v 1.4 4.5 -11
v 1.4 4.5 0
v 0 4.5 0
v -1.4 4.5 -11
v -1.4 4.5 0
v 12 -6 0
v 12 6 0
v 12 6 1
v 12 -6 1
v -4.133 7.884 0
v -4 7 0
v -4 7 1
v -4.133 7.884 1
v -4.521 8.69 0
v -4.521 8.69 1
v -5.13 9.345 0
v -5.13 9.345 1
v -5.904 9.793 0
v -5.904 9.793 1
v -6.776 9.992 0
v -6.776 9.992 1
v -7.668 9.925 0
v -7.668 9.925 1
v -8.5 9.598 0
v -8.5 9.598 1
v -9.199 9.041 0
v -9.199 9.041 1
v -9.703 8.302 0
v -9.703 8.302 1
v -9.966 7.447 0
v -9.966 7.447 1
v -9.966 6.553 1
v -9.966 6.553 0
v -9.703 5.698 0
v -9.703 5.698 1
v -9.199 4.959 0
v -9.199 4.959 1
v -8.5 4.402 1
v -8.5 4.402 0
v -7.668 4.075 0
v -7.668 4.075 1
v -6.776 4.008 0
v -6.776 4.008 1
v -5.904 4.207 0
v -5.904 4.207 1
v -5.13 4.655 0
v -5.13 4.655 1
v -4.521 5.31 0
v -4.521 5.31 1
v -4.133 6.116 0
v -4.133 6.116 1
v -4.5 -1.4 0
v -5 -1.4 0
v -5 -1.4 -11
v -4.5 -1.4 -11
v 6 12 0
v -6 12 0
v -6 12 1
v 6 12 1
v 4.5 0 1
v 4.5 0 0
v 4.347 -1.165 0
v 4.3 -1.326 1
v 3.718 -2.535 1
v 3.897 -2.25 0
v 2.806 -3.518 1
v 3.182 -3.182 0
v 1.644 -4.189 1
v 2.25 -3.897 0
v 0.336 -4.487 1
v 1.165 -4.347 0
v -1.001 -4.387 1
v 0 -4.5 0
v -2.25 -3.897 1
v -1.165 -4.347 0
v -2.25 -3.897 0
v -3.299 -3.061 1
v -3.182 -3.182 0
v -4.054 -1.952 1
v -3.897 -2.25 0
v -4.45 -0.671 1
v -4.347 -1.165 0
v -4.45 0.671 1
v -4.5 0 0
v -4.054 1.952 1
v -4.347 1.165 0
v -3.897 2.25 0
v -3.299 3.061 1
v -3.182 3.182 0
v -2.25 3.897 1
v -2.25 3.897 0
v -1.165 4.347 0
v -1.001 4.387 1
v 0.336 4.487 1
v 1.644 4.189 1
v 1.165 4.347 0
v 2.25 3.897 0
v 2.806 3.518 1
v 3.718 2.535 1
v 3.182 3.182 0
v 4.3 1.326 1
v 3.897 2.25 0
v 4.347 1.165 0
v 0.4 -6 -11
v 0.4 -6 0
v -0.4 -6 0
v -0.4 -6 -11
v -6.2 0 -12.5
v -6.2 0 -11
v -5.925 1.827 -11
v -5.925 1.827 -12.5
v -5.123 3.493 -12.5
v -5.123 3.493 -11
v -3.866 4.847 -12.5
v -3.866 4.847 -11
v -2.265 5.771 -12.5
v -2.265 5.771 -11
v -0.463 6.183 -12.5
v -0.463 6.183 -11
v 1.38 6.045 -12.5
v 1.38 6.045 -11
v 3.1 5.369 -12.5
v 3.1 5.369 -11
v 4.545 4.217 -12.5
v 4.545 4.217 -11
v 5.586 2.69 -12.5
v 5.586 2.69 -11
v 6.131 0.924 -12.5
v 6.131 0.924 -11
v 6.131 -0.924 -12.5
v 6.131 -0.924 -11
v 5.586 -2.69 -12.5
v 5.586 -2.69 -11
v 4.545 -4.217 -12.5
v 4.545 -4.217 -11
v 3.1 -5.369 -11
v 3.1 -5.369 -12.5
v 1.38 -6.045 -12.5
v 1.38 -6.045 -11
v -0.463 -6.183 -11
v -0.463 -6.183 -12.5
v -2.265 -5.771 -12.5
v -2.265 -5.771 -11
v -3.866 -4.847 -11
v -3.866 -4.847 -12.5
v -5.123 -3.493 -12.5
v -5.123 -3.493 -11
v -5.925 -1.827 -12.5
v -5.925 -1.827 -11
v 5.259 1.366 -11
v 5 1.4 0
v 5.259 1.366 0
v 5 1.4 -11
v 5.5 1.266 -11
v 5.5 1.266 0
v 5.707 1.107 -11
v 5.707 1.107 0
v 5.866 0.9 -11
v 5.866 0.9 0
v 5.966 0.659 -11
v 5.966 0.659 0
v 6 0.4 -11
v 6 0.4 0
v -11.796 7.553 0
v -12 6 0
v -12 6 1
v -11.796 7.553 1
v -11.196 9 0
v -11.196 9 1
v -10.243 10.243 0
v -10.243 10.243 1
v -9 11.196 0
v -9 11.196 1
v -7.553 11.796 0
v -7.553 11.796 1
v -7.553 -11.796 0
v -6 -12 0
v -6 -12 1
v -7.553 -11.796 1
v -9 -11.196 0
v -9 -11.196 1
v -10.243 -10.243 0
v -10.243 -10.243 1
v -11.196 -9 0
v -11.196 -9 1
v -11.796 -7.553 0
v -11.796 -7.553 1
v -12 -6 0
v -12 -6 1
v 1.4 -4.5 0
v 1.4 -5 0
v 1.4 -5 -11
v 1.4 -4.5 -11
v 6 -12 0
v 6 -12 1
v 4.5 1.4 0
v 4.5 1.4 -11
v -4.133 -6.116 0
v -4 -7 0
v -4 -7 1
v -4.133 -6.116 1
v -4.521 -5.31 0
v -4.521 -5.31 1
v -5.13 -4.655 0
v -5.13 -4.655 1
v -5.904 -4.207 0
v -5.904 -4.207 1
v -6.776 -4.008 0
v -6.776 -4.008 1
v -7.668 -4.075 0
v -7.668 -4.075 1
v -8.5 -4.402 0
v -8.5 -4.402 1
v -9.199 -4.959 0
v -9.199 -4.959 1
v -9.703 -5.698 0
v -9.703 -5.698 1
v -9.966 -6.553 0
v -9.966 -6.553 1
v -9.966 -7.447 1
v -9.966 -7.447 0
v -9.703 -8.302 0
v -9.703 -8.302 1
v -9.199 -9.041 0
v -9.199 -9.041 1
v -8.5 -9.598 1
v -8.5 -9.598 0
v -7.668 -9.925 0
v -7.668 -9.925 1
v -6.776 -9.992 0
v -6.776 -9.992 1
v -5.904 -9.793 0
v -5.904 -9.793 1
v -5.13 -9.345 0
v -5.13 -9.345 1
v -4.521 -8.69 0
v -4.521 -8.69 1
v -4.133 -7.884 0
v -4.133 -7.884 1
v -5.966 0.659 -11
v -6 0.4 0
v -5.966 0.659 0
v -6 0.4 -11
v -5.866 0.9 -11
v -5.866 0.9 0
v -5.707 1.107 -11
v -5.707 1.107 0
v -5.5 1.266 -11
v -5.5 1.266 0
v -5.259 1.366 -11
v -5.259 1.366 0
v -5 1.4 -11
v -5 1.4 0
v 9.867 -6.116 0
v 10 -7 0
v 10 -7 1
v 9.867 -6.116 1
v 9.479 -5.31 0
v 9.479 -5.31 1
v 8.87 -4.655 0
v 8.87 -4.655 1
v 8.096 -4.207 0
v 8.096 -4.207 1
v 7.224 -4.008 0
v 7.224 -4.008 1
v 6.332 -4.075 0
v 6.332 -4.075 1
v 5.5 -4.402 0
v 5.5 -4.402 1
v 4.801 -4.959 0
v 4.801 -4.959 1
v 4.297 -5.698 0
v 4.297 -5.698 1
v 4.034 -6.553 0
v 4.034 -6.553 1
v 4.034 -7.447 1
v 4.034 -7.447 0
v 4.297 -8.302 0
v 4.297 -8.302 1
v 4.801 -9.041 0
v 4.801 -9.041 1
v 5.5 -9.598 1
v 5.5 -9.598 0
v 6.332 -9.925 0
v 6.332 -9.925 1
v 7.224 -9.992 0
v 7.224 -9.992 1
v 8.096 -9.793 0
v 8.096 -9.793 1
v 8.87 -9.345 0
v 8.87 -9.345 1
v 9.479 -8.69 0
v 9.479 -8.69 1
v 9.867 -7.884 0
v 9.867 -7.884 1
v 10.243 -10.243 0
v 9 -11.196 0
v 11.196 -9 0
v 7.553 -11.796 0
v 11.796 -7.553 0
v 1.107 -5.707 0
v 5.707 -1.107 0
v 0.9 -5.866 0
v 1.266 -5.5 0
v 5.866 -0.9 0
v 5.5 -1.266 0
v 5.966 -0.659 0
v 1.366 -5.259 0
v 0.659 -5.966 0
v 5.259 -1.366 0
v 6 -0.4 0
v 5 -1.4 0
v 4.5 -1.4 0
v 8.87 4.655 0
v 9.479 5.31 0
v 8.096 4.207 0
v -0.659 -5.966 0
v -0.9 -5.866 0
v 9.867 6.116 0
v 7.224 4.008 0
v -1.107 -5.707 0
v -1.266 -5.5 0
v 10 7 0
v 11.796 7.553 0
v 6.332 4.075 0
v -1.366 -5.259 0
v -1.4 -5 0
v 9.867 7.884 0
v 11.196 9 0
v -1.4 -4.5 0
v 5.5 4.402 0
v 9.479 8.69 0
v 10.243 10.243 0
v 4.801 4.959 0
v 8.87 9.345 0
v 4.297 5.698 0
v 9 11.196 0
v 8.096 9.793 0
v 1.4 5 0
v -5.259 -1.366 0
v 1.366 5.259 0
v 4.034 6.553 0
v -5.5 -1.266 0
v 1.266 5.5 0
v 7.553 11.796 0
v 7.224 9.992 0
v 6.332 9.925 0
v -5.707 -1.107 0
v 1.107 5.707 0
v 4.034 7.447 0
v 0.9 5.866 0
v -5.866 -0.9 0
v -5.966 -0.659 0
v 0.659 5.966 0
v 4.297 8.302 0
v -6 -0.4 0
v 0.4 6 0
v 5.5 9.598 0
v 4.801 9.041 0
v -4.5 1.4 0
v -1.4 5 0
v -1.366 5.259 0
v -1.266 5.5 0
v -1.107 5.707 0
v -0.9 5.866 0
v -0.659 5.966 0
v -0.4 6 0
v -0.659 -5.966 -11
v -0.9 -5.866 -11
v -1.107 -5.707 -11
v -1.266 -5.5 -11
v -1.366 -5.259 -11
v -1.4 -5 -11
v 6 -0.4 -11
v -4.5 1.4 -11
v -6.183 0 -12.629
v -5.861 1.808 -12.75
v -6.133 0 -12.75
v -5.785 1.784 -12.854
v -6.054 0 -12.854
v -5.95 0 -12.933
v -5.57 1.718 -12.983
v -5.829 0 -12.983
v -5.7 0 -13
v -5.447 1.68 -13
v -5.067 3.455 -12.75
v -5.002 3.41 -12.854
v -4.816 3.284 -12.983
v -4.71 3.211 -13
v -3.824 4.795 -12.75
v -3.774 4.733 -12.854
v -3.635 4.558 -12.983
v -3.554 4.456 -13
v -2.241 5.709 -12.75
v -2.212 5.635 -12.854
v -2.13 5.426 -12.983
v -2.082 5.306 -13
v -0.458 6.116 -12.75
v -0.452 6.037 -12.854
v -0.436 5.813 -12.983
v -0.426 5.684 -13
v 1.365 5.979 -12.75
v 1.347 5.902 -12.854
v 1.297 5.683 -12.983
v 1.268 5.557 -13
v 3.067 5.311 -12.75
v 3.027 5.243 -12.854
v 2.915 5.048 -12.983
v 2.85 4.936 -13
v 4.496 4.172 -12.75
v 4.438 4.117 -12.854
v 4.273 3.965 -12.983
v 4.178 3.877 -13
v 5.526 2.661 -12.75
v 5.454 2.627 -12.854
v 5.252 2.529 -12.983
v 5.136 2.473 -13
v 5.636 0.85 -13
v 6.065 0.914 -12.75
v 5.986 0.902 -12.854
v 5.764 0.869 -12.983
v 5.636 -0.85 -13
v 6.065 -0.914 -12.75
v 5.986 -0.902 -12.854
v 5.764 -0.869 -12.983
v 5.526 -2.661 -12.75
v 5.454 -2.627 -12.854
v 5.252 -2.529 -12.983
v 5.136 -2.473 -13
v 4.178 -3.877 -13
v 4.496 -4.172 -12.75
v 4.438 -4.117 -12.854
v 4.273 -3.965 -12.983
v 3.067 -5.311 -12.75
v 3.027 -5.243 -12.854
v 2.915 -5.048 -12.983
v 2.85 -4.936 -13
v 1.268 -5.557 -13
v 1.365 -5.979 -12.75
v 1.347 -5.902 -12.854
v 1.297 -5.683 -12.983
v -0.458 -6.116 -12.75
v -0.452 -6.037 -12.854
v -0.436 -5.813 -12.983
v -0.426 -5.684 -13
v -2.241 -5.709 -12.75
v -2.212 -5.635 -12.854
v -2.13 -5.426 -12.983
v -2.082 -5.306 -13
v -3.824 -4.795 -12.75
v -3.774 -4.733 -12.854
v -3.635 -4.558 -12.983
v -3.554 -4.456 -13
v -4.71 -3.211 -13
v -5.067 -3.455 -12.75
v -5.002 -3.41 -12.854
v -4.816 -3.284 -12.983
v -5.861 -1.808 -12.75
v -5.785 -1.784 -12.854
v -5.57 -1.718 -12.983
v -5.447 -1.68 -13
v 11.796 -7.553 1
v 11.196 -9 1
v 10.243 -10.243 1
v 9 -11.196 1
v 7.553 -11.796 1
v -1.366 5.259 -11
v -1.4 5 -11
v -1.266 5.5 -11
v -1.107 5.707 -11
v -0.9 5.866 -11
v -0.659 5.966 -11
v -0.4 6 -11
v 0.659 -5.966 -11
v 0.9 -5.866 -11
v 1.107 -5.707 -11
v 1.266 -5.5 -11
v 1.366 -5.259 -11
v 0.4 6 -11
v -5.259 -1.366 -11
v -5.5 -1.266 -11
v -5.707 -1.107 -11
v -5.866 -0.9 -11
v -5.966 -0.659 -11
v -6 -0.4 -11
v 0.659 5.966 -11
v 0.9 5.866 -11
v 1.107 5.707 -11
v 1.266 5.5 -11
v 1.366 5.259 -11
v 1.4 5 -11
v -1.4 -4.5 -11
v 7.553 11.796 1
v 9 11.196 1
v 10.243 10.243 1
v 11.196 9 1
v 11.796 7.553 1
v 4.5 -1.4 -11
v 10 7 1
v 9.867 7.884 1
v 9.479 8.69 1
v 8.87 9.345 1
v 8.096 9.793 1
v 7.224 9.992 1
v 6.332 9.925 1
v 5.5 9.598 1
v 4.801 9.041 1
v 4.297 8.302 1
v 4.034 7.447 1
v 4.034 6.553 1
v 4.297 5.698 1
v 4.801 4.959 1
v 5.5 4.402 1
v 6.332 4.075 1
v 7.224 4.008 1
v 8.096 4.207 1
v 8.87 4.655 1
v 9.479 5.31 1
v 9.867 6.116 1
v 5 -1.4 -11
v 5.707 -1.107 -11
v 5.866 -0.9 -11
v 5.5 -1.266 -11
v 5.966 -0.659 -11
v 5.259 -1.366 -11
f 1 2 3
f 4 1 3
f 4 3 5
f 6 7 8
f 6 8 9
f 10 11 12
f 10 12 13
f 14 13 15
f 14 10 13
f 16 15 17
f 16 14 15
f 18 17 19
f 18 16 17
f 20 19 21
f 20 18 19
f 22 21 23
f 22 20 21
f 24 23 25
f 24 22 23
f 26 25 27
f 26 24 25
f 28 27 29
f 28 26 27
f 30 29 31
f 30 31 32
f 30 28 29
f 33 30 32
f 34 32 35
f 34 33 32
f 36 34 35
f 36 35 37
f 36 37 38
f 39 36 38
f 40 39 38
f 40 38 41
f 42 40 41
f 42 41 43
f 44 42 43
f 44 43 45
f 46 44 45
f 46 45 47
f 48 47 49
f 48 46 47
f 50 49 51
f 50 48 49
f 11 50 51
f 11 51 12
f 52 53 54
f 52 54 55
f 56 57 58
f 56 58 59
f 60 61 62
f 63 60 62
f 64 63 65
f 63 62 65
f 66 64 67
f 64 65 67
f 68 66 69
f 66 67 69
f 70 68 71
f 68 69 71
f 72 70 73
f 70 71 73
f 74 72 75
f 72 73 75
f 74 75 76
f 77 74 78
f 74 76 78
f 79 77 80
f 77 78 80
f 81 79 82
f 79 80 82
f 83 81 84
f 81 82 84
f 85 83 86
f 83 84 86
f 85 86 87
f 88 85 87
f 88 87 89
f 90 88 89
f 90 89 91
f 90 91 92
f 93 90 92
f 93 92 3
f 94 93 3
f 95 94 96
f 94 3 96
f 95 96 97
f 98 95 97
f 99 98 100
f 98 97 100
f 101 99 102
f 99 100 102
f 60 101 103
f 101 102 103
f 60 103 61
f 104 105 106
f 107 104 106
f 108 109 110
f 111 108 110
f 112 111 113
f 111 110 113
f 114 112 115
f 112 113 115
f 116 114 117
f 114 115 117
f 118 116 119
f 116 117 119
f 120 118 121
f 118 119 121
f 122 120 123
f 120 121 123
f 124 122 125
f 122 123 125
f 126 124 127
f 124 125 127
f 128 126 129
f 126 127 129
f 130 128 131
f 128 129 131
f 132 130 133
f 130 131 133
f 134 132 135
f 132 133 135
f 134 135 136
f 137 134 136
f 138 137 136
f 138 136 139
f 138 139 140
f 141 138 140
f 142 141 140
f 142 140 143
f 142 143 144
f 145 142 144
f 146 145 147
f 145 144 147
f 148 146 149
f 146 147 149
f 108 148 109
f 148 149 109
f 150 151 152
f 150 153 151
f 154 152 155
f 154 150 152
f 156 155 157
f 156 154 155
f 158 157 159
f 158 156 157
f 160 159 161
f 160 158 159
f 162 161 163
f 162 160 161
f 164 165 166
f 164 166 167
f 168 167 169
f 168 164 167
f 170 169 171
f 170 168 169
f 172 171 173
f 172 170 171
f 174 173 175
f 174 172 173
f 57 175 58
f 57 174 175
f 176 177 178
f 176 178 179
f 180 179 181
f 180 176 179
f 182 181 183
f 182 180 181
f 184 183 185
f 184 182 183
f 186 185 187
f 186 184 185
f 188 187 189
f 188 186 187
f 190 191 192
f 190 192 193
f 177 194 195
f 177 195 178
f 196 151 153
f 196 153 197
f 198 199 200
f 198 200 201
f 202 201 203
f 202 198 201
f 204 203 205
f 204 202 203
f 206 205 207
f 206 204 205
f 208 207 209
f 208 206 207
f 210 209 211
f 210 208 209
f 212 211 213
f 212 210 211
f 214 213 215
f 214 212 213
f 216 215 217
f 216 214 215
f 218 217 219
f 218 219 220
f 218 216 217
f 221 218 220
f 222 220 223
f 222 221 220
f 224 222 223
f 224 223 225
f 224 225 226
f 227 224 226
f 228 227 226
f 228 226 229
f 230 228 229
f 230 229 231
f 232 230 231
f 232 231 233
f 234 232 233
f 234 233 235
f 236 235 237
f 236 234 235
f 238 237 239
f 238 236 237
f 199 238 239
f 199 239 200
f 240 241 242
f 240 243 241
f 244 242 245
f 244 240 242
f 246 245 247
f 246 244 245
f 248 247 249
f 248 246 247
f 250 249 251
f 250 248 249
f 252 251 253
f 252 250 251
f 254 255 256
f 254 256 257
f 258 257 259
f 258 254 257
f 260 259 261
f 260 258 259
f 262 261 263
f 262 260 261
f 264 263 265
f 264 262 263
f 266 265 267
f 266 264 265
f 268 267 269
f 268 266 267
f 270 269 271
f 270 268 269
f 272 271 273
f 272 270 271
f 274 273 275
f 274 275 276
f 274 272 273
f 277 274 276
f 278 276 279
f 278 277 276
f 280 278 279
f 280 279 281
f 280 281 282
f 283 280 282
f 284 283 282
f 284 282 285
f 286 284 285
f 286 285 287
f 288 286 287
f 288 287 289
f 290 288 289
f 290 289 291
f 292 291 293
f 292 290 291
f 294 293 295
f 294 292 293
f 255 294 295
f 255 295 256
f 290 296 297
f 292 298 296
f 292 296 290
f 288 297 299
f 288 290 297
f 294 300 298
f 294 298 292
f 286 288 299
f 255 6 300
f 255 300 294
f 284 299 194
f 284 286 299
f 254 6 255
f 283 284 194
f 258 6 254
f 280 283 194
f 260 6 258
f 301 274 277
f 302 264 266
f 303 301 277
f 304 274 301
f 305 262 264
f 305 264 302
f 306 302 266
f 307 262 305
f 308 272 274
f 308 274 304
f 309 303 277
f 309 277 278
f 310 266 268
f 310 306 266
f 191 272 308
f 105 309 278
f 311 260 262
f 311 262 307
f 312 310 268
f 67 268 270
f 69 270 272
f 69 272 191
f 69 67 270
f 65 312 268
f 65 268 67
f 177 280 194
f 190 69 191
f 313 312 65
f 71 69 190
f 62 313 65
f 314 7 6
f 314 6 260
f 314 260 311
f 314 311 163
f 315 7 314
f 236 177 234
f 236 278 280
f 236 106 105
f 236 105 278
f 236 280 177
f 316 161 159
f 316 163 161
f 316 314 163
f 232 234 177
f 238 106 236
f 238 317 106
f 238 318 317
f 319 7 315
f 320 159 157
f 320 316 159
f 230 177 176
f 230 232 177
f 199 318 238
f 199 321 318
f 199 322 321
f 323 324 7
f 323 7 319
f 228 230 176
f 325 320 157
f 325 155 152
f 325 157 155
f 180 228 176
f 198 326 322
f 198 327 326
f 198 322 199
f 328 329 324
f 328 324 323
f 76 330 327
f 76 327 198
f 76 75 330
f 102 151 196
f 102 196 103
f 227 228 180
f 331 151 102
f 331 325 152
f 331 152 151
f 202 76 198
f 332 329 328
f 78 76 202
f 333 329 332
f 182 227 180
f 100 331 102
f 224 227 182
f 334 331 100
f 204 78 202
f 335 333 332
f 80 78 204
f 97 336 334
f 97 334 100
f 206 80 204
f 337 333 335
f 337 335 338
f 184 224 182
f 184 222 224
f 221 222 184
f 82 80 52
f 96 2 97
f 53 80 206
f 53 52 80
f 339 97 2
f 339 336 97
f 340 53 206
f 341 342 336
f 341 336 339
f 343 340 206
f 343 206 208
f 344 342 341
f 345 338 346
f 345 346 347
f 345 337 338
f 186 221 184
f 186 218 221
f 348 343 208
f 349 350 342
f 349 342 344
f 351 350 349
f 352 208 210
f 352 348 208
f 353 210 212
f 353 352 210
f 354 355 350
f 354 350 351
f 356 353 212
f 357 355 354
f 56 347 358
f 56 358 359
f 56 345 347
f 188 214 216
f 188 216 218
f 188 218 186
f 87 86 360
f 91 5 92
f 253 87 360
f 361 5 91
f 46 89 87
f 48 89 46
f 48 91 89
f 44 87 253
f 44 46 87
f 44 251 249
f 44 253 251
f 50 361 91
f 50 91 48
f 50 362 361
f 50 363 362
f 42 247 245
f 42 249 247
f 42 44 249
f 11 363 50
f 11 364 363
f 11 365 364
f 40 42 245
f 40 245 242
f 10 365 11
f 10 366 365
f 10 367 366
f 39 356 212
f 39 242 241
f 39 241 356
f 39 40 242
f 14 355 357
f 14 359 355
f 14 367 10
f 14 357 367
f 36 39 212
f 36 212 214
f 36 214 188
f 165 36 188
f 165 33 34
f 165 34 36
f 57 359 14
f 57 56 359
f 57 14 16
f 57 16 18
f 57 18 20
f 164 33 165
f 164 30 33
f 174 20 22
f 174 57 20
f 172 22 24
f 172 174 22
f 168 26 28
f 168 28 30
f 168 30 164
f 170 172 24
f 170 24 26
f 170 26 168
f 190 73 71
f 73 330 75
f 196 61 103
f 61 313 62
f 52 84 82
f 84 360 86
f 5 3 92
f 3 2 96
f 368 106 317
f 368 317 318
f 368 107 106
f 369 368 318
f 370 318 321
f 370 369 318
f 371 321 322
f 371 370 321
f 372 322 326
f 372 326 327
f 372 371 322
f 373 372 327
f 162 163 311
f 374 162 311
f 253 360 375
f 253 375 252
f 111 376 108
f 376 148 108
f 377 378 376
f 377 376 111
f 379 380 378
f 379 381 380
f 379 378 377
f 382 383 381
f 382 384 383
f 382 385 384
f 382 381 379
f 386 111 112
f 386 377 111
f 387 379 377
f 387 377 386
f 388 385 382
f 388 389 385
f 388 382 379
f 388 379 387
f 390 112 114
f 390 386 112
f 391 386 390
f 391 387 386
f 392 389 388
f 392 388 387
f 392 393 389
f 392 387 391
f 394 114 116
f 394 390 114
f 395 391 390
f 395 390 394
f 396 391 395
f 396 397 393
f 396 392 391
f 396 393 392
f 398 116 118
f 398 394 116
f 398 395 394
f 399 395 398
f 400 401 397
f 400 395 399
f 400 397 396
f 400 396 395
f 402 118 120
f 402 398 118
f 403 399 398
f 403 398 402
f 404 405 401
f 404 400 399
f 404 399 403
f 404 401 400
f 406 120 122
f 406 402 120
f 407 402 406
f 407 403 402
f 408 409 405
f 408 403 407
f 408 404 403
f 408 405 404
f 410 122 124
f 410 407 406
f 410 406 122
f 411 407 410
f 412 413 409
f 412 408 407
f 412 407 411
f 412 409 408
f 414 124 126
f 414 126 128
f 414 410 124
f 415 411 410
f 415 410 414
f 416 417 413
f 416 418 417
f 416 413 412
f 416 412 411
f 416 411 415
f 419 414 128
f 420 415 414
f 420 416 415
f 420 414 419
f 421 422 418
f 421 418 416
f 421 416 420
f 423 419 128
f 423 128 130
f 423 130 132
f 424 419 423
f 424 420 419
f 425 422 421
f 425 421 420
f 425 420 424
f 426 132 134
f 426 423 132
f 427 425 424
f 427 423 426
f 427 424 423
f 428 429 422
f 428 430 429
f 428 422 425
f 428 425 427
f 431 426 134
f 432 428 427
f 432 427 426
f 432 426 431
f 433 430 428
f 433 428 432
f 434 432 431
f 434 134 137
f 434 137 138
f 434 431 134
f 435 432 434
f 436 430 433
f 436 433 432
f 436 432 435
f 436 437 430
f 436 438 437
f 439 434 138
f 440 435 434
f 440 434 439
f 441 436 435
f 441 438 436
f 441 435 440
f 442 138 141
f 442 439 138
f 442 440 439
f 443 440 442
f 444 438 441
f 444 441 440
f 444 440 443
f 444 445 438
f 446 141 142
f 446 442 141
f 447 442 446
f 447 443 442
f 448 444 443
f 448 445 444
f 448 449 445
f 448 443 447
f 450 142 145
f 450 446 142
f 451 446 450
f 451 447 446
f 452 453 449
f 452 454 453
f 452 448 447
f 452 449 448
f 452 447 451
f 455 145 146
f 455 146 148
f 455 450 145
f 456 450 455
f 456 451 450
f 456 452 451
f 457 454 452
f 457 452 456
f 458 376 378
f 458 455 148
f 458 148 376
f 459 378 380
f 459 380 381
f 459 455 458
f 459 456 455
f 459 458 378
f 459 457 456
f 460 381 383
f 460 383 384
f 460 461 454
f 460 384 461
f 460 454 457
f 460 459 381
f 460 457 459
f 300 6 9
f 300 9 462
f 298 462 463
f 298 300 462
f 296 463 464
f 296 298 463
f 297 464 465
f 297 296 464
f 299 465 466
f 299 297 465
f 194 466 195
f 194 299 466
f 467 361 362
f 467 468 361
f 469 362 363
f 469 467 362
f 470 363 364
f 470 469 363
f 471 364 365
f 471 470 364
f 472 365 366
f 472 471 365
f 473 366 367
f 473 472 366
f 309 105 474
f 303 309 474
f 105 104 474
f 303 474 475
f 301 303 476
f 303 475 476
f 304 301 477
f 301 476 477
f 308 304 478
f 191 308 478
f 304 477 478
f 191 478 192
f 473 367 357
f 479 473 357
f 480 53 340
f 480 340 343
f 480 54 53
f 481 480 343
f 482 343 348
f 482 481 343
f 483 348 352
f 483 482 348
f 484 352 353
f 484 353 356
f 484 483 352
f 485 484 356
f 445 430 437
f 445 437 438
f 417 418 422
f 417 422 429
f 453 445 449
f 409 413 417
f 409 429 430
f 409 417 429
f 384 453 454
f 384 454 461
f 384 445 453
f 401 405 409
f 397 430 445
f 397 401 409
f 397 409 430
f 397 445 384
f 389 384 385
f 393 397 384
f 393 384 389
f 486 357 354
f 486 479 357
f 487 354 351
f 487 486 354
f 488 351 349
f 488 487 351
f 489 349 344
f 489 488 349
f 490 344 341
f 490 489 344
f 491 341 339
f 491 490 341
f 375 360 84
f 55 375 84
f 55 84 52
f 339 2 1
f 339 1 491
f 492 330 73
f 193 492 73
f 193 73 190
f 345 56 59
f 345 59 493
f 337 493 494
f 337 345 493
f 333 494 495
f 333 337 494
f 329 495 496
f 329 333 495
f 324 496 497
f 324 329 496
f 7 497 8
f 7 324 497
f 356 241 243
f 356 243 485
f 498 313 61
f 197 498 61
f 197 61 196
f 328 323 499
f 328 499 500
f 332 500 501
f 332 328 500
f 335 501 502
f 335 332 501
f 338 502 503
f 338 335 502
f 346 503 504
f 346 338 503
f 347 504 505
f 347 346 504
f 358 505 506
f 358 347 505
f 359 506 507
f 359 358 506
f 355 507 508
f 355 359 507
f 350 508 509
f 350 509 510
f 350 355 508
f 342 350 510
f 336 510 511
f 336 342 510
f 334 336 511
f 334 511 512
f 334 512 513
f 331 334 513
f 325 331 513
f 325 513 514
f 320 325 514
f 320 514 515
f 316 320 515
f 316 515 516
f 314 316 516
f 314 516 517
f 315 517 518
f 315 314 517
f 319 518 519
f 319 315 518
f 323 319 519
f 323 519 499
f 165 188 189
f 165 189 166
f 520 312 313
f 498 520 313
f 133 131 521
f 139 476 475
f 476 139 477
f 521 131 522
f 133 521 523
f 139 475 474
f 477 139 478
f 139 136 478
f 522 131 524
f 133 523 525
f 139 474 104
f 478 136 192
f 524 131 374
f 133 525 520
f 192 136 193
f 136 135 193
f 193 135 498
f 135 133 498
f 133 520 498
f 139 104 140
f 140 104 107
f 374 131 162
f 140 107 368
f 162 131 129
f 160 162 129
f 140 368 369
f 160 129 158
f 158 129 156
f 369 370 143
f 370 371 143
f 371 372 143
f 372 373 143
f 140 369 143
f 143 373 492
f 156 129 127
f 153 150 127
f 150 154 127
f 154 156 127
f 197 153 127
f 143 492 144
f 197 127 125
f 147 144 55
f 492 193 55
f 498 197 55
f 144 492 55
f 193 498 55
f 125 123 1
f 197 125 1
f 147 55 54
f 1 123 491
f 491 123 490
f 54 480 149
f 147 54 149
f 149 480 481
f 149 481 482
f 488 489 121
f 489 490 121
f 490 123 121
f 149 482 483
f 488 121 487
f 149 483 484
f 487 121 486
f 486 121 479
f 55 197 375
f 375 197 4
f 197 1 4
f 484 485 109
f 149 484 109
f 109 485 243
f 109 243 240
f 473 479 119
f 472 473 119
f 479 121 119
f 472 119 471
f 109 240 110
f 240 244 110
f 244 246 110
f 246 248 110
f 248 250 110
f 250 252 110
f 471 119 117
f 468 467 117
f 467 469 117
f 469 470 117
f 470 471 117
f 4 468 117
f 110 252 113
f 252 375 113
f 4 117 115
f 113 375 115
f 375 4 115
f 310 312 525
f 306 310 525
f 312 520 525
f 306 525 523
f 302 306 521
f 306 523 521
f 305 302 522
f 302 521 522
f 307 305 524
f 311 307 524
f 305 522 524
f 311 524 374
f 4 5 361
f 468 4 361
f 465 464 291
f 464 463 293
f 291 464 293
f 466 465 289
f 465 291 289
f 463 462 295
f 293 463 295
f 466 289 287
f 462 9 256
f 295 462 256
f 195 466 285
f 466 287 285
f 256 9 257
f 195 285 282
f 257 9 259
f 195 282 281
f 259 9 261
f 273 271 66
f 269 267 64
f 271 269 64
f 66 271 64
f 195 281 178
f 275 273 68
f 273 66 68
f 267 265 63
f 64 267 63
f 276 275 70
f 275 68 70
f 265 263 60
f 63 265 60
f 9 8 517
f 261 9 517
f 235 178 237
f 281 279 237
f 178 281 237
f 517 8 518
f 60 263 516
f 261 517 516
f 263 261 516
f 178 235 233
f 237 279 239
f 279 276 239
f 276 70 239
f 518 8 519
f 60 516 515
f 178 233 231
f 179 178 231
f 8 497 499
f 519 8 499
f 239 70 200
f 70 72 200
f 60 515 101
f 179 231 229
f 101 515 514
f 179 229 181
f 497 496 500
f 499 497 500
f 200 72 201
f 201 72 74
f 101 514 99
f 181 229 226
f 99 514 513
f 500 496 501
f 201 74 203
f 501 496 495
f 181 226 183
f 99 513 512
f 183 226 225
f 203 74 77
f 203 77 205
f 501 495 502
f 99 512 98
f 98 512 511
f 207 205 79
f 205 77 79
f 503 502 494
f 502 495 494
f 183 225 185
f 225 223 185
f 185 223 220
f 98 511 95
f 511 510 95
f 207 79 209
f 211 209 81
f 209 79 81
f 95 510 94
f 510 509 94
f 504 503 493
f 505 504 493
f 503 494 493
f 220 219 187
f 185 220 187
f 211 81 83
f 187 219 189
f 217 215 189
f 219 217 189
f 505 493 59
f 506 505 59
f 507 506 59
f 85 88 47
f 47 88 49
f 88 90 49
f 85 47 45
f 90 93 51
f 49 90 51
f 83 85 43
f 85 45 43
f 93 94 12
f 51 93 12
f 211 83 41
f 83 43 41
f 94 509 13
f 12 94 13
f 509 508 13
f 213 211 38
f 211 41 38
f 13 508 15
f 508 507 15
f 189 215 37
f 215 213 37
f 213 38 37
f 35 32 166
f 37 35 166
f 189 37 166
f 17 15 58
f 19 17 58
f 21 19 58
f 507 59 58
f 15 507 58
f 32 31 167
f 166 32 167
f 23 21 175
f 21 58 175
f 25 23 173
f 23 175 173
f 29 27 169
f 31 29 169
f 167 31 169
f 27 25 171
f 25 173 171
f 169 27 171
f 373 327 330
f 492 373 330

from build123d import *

# Parameters (mm, degrees)
SKETCH2_R           = 3
BOSS_EXTRUDE2_DEPTH = 1
SKETCH6_W           = 2.8
SKETCH6_H           = 1.5
SKETCH6_W_2         = 1.5
SKETCH6_H_2         = 2.8
BOSS_EXTRUDE5_DEPTH = 11
FILLET4_R           = 1
SKETCH8_R           = 4.5
CUT_EXTRUDE1_DEPTH  = 20
SKETCH9_R           = 6.2
BOSS_EXTRUDE6_DEPTH = 2
FILLET5_R           = 0.5


with BuildPart() as part:
    # Sketch2 → Boss-Extrude2 (new body)
    with BuildSketch(Plane.XY):
        with BuildLine():
            Line((12, -6), (12, 0))
            Line((12, 0), (12, 6))
            ThreePointArc((12, 6), (10.242640687, 10.242640687), (6, 12))
            Line((6, 12), (0, 12))
            Line((0, 12), (-6, 12))
            ThreePointArc((-6, 12), (-10.242640687, 10.242640687), (-12, 6))
            Line((-12, 6), (-12, 0))
            Line((-12, 0), (-12, -6))
            ThreePointArc((-12, -6), (-10.242640687, -10.242640687), (-6, -12))
            Line((-6, -12), (0, -12))
            Line((0, -12), (6, -12))
            ThreePointArc((6, -12), (10.242640687, -10.242640687), (12, -6))
        make_face()
        with Locations((-7, -7)):
            Circle(SKETCH2_R, mode=Mode.SUBTRACT)
        with Locations((7, -7)):
            Circle(SKETCH2_R, mode=Mode.SUBTRACT)
        with Locations((-7, 7)):
            Circle(SKETCH2_R, mode=Mode.SUBTRACT)
        Circle(SKETCH2_R, mode=Mode.SUBTRACT)
        with Locations((7, 7)):
            Circle(SKETCH2_R, mode=Mode.SUBTRACT)
    extrude(amount=BOSS_EXTRUDE2_DEPTH)

    # Sketch6 → Boss-Extrude5 (add)
    with BuildSketch(Plane(origin=(0, 0, 0), x_dir=(-1, 0, 0), z_dir=(0, 0, -1))):
        with Locations((0, 5.25)):
            Rectangle(SKETCH6_W, SKETCH6_H)
        with Locations((-5.25, 0)):
            Rectangle(SKETCH6_W_2, SKETCH6_H_2)
        with Locations((0, -5.25)):
            Rectangle(SKETCH6_W, SKETCH6_H)
        with Locations((5.25, 0)):
            Rectangle(SKETCH6_W_2, SKETCH6_H_2)
    extrude(amount=BOSS_EXTRUDE5_DEPTH)

    # Fillet4
    fillet4_edges = [part.edges().sort_by_distance(p)[0] for p in [
        (-6, -1.4, -5.5),
        (-6, 1.4, -5.5),
        (-1.4, -6, -5.5),
        (1.4, -6, -5.5),
        (6, -1.4, -5.5),
        (6, 1.4, -5.5),
        (-1.4, 6, -5.5),
        (1.4, 6, -5.5),
    ]]
    fillet(fillet4_edges, radius=FILLET4_R)

    # Sketch8 → Cut-Extrude1 (cut)
    with BuildSketch(Plane(origin=(0, 0, -11), x_dir=(-1, 0, 0), z_dir=(0, 0, -1))):
        Circle(SKETCH8_R)
    extrude(amount=-CUT_EXTRUDE1_DEPTH, mode=Mode.SUBTRACT)

    # Sketch9 → Boss-Extrude6 (add)
    with BuildSketch(Plane(origin=(0, 0, -11), x_dir=(-1, 0, 0), z_dir=(0, 0, -1))):
        Circle(SKETCH9_R)
    extrude(amount=BOSS_EXTRUDE6_DEPTH)

    # Fillet5
    fillet5_edges = [part.edges().sort_by_distance(p)[0] for p in [
        (6.2, 0, -13),
    ]]
    fillet(fillet5_edges, radius=FILLET5_R)


solid = part.part
